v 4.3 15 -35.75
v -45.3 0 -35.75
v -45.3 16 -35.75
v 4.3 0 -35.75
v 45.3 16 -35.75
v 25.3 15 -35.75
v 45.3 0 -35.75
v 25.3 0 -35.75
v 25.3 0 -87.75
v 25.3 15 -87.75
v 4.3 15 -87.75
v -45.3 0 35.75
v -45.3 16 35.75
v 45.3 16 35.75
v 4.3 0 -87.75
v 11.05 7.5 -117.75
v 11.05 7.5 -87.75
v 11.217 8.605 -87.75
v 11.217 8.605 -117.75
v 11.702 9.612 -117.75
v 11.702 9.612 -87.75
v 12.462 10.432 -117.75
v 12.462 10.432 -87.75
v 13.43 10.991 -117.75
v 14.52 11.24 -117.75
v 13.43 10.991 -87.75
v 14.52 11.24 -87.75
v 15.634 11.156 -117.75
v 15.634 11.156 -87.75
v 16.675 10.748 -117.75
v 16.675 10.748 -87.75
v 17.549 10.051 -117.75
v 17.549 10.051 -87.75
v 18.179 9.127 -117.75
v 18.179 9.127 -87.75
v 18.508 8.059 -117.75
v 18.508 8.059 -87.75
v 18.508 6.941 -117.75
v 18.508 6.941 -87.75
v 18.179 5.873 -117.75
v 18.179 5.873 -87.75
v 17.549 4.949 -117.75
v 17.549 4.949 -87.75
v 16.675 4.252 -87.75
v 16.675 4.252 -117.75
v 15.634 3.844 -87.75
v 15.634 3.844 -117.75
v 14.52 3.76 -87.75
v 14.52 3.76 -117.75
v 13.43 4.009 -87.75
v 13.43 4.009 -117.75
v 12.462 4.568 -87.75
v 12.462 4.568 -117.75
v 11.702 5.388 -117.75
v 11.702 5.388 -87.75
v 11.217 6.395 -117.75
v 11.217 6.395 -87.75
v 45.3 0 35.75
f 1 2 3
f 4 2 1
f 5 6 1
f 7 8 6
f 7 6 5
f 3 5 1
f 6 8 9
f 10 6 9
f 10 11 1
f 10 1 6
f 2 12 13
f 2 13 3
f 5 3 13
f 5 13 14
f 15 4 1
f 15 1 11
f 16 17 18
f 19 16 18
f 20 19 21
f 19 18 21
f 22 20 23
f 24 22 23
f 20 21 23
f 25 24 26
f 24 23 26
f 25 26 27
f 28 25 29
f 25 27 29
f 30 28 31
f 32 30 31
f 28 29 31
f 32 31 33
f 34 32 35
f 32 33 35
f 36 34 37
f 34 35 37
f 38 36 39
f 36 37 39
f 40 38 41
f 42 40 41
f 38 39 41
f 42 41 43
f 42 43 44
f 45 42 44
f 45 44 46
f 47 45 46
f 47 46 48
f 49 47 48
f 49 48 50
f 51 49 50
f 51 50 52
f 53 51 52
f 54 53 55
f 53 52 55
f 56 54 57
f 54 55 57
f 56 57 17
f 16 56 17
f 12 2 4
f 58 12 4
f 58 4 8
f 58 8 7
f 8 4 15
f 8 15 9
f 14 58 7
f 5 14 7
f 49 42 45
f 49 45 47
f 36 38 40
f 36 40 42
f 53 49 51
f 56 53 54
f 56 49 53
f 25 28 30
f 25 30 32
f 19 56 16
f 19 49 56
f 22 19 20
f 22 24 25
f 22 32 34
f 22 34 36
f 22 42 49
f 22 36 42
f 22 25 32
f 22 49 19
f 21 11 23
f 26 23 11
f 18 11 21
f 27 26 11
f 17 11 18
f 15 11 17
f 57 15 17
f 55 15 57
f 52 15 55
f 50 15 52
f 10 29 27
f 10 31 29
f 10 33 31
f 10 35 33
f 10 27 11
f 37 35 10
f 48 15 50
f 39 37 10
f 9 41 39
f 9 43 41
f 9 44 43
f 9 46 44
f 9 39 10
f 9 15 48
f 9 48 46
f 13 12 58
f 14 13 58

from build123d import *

# Parameters (mm, degrees)
SKETCH1_W           = 90.6
SKETCH1_H           = 71.5
BOSS_EXTRUDE1_DEPTH = 16
SKETCH2_W           = 21
SKETCH2_H           = 52
BOSS_EXTRUDE2_DEPTH = 15
SKETCH3_R           = 3.75
BOSS_EXTRUDE3_DEPTH = 30


with BuildPart() as part:
    # Sketch1 → Boss-Extrude1 (new body)
    with BuildSketch(Plane(origin=(0, 0, 0), x_dir=(1, 0, 0), z_dir=(0, 1, 0))):
        Rectangle(SKETCH1_W, SKETCH1_H)
    extrude(amount=BOSS_EXTRUDE1_DEPTH)

    # Sketch2 → Boss-Extrude2 (add)
    with BuildSketch(Plane(origin=(0, 0, 0), x_dir=(1, 0, 0), z_dir=(0, 1, 0))):
        with Locations((14.8, 61.75)):
            Rectangle(SKETCH2_W, SKETCH2_H)
    extrude(amount=BOSS_EXTRUDE2_DEPTH)

    # Sketch3 → Boss-Extrude3 (add)
    with BuildSketch(Plane(origin=(0, 0, -87.75), x_dir=(-1, 0, 0), z_dir=(0, 0, -1))):
        with Locations((-14.8, 7.5)):
            Circle(SKETCH3_R)
    extrude(amount=BOSS_EXTRUDE3_DEPTH)


solid = part.part
